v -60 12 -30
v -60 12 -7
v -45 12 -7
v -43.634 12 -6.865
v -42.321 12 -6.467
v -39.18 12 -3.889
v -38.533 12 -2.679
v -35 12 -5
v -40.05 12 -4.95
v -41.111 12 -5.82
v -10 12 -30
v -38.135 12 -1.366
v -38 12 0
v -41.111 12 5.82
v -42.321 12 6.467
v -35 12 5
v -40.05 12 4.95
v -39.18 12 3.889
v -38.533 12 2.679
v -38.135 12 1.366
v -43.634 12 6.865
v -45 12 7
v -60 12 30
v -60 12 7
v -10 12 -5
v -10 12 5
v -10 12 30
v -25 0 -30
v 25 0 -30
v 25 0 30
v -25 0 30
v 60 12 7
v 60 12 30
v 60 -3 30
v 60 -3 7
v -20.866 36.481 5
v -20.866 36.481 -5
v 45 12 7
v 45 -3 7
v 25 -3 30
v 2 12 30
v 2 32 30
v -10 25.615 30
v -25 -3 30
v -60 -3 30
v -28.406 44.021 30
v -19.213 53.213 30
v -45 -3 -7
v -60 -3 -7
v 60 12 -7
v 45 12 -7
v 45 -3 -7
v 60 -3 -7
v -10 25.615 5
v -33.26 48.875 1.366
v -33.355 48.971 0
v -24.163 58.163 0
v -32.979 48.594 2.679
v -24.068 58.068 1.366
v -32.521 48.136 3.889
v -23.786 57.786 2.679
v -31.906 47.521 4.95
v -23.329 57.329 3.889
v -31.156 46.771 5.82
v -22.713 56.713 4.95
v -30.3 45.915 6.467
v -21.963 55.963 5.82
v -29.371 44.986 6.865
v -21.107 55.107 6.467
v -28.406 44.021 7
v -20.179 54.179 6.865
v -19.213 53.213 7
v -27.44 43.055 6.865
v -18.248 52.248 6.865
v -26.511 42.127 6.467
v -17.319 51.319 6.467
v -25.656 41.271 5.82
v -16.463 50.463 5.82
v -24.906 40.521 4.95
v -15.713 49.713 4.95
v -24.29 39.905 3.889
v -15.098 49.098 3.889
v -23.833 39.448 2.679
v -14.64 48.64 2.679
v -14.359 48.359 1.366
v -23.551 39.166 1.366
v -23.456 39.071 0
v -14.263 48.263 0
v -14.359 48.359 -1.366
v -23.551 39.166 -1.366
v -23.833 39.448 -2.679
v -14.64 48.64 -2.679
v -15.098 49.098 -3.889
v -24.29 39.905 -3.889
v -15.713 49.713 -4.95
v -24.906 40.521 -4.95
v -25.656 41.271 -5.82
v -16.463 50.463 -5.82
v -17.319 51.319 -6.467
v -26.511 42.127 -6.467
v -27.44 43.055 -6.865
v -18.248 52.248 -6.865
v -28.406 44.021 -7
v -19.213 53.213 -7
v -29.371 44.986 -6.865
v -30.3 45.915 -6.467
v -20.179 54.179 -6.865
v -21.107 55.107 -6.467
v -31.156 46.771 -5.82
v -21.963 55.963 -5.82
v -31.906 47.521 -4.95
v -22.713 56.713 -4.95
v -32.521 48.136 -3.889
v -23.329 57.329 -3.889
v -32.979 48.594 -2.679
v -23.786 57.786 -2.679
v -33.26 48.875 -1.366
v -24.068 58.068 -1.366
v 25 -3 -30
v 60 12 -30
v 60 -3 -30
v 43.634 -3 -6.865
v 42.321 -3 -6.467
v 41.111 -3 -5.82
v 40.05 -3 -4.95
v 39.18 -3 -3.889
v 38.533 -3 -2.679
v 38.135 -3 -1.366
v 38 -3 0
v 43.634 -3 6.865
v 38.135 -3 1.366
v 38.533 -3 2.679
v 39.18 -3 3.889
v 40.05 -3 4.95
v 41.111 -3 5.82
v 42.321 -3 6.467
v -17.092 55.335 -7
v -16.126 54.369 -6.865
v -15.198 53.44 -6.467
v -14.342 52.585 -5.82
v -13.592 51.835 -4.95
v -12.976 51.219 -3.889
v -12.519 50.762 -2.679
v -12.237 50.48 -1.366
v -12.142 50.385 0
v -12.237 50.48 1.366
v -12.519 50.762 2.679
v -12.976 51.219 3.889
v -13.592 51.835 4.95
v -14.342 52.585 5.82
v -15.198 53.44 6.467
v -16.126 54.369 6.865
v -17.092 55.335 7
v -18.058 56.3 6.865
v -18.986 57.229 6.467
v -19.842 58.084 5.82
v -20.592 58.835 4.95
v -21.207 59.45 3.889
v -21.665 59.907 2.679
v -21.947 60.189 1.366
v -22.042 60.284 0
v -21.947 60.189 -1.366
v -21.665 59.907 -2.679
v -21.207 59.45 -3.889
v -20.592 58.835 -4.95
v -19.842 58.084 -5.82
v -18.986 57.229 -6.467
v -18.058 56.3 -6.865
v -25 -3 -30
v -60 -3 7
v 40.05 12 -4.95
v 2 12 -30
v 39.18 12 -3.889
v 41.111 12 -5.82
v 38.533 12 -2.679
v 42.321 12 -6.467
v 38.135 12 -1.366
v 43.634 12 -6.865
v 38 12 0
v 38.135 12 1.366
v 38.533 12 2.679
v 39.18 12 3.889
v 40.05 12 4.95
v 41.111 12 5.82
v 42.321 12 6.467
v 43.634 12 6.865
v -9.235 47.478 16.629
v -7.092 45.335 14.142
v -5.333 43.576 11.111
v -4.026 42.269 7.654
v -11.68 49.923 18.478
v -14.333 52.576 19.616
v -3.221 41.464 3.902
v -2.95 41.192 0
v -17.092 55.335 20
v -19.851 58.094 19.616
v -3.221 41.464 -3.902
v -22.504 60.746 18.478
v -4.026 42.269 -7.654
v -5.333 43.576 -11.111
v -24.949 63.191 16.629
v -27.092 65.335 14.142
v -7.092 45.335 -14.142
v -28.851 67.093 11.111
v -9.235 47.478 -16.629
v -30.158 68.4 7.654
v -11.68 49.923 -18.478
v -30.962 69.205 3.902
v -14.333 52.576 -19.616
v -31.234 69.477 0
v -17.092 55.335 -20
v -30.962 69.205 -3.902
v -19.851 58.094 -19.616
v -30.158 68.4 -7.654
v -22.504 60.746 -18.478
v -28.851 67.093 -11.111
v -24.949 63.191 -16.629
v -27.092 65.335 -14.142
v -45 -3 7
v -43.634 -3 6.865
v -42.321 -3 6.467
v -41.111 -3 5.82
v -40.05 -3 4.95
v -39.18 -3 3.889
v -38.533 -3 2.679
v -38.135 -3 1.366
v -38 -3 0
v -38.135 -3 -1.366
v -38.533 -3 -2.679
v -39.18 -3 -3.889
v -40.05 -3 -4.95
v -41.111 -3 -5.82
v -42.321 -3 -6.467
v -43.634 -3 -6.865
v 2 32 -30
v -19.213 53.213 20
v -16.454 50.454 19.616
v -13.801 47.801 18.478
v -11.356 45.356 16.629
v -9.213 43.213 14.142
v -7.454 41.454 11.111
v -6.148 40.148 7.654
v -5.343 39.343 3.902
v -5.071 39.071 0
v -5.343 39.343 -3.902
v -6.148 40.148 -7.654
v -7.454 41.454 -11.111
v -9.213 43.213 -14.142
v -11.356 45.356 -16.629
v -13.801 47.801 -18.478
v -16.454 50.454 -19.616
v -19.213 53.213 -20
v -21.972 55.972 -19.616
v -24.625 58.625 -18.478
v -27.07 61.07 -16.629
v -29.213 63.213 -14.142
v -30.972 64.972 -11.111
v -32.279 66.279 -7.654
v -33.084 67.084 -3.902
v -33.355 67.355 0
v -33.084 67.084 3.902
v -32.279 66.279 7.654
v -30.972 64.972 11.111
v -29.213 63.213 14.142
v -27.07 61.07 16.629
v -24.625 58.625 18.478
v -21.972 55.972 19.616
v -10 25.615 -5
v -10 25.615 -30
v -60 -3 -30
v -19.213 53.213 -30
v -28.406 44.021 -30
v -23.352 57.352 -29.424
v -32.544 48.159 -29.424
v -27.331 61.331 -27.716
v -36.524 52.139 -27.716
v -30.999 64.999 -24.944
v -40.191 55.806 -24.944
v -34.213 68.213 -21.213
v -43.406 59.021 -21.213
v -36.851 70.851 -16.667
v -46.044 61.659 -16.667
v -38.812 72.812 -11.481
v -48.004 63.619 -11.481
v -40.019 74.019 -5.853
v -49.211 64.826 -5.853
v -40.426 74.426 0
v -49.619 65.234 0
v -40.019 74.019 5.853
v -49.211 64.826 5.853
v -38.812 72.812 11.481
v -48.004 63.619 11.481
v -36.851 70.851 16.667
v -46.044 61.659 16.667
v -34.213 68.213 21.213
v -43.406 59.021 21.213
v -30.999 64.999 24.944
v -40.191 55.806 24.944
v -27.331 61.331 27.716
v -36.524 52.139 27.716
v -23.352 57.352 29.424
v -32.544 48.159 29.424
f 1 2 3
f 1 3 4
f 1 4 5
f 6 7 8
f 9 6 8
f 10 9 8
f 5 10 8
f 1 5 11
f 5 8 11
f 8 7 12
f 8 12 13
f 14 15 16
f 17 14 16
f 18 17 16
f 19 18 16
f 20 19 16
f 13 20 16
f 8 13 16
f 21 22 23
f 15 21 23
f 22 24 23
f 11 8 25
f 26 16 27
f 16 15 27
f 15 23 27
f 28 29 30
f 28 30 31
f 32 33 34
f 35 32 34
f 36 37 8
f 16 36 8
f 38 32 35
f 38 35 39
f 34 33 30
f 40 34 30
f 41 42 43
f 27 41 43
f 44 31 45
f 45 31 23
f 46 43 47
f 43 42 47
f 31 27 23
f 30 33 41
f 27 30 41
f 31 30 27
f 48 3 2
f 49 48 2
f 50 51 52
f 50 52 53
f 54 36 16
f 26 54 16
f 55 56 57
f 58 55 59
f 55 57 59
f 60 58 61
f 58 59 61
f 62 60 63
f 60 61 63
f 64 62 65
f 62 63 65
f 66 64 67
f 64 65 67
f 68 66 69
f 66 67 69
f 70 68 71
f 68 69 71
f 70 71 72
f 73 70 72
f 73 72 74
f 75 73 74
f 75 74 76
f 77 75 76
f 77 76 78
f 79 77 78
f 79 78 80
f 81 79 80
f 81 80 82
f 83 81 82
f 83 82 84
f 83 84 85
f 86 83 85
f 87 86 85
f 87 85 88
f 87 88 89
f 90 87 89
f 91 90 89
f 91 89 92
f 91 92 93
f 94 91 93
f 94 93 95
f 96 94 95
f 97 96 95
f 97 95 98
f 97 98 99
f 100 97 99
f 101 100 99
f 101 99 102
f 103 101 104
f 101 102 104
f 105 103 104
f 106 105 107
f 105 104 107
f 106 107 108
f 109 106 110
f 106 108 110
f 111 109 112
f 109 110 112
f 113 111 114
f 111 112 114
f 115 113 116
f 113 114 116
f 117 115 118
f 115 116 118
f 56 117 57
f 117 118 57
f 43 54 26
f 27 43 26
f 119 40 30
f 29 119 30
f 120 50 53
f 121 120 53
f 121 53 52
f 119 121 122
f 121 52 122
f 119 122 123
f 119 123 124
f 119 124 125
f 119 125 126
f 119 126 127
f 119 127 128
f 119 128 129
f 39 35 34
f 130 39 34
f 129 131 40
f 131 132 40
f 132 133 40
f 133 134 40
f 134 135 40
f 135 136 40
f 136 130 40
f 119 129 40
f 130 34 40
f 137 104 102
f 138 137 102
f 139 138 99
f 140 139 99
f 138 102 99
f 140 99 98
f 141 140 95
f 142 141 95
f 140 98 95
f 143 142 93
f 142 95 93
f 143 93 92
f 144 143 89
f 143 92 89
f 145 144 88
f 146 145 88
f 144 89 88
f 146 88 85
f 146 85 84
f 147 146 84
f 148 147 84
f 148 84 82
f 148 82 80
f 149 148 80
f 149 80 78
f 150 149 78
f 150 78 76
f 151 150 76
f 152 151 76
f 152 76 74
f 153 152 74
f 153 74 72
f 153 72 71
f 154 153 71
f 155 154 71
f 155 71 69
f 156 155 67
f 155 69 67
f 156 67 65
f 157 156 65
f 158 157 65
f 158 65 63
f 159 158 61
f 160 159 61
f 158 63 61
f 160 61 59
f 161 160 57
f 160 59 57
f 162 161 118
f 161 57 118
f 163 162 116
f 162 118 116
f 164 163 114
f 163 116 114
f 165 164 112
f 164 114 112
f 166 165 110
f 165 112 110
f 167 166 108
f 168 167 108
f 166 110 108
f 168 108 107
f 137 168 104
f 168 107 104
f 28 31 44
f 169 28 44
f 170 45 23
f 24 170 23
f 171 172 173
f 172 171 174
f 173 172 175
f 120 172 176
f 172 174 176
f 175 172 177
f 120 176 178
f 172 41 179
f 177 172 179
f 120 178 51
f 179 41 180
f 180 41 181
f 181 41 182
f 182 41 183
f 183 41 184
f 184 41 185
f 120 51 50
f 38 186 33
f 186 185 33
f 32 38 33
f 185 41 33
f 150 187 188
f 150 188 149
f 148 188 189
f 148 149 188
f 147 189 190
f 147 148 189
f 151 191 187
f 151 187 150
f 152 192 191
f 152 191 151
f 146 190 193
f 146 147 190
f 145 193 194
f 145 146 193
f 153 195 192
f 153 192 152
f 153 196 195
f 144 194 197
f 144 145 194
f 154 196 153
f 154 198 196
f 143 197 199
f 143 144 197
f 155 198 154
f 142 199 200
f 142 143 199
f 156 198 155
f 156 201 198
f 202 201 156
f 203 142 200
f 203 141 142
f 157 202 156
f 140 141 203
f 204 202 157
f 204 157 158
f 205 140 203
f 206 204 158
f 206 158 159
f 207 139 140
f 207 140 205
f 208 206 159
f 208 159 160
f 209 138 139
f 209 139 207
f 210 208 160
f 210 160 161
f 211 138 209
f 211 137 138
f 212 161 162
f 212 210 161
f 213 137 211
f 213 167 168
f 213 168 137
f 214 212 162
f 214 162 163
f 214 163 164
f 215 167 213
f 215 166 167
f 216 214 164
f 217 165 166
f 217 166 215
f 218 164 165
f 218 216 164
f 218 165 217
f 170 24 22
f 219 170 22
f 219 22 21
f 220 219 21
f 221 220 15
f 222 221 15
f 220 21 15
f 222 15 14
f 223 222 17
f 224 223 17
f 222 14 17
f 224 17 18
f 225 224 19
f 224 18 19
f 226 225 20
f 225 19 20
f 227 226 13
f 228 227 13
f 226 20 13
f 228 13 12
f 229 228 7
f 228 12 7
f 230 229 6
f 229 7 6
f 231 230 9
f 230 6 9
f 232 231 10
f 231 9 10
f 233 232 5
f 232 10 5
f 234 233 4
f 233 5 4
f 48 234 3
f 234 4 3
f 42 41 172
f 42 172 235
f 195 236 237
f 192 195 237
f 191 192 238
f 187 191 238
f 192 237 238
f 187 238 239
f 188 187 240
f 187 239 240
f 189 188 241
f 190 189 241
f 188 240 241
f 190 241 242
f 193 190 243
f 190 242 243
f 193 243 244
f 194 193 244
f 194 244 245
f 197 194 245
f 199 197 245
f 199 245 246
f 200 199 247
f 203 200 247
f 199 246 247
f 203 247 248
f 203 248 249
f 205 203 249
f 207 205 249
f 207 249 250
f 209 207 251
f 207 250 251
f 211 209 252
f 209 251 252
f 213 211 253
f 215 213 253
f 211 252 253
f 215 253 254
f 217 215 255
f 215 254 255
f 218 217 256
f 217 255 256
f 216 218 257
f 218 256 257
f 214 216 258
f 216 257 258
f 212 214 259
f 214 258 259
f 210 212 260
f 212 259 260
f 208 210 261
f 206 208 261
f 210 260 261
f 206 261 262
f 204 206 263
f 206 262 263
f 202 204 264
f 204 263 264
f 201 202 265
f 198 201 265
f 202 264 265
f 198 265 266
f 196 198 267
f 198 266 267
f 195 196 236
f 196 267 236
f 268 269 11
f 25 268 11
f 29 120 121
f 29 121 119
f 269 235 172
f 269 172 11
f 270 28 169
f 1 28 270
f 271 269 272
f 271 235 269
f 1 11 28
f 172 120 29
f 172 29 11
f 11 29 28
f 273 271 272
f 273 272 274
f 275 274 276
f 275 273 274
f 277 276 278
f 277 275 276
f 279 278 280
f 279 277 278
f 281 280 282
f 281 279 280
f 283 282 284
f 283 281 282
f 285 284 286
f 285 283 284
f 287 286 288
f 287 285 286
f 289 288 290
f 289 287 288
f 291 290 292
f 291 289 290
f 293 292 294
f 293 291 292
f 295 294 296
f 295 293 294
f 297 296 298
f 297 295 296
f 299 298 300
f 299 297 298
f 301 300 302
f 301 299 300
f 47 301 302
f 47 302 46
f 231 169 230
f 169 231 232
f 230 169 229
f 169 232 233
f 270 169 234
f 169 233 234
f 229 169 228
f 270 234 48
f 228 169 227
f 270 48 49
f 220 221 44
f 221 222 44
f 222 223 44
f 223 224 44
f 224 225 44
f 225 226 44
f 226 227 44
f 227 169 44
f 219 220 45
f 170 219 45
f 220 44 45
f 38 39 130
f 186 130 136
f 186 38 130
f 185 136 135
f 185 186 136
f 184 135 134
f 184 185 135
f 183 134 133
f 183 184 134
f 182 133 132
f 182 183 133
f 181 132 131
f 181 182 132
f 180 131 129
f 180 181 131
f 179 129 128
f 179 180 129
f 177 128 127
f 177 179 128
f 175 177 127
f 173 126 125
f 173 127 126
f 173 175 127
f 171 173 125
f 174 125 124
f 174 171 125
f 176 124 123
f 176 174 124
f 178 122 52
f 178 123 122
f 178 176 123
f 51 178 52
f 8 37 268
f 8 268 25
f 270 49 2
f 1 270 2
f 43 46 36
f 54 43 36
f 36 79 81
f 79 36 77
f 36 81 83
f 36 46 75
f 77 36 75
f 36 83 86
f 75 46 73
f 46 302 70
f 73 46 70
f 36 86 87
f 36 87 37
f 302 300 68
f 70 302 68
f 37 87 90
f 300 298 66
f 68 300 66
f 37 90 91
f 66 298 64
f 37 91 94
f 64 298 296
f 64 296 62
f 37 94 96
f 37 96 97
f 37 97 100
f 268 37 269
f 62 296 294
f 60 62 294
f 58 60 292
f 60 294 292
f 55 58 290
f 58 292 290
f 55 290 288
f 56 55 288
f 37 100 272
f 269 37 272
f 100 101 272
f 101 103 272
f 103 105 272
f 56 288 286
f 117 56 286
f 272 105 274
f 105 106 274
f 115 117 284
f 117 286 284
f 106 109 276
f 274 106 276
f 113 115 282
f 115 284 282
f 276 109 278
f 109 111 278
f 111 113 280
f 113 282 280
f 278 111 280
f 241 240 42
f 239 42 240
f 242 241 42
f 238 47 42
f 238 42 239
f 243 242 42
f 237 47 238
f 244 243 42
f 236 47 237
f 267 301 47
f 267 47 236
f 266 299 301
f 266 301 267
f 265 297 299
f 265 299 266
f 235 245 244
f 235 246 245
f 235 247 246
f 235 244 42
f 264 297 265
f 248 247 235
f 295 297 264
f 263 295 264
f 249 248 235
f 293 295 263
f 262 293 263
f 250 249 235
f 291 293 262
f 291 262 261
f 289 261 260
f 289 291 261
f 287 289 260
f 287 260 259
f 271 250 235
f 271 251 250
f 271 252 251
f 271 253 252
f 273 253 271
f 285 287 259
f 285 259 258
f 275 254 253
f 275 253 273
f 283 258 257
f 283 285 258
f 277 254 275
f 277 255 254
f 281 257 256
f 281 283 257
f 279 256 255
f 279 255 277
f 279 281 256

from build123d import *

# Parameters (mm, degrees)
EXTRUDE_1_DEPTH     = 30
CUT_EXTRUDE_1_DEPTH = 69.738635424
EXTRUDE_2_DEPTH     = 30
SKETCH_4_R          = 30
EXTRUDE_3_DEPTH     = 13
EXTRUDE_4_DEPTH     = 3
CUT_EXTRUDE_2_REACH = 102.632
SKETCH_5_R          = 7
RIB_1_REACH         = 102.196
SKETCH_6_WALL_W     = 230.660820914
SKETCH_6_WALL_H     = 10


with BuildPart() as part:
    # 草图1 → 凸台-拉伸1 (new, symmetric)
    with BuildSketch(Plane.XY):
        Polygon((-25, 0), (-25, -3), (-60, -3), (-60, 12), (60, 12), (60, -3), (25, -3), (25, 0), align=None)
    extrude(amount=EXTRUDE_1_DEPTH, both=True)

    # 草图2 → 切除-拉伸1 (cut, through all)
    with BuildSketch(Plane(origin=(0, 12, 0), x_dir=(1, 0, 0), z_dir=(0, 1, 0))):
        with BuildLine():
            Line((75, -7), (45, -7))
            ThreePointArc((45, -7), (38, 0), (45, 7))
            Line((45, 7), (75, 7))
            ThreePointArc((75, 7), (82, 0), (75, -7))
        make_face()
        with BuildLine():
            Line((-75, -7), (-45, -7))
            ThreePointArc((-45, -7), (-38, 0), (-45, 7))
            Line((-45, 7), (-75, 7))
            ThreePointArc((-75, 7), (-82, 0), (-75, -7))
        make_face()
    extrude(amount=-CUT_EXTRUDE_1_DEPTH, mode=Mode.SUBTRACT)

    # 草图3 → 凸台-拉伸2 (add, symmetric)
    with BuildSketch(Plane.XY):
        Polygon((-10, 12), (2, 12), (2, 32), (-19.213203436, 53.213203436), (-28.405591591, 44.02081528), (-10, 25.615223689), align=None)
    extrude(amount=EXTRUDE_2_DEPTH, both=True)

    # 草图4 → 凸台-拉伸3 (add)
    with BuildSketch(Plane(origin=(17, 17, 0), x_dir=(0, 0, -1), z_dir=(0.7071067811865483, 0.7071067811865468, 0))):
        with Locations((0, 51.213203436)):
            Circle(SKETCH_4_R)
    extrude(amount=-EXTRUDE_3_DEPTH)

    # 草图4<3> → 凸台-拉伸4 (add)
    with BuildSketch(Plane(origin=(17, 17, 0), x_dir=(0, 0, -1), z_dir=(0.7071067811865483, 0.7071067811865468, 0))):
        with BuildLine():
            Line((7, 51.213203436), (20, 51.213203436))
            ThreePointArc((20, 51.213203436), (0, 71.213203436), (-20, 51.213203436))
            Line((-20, 51.213203436), (-7, 51.213203436))
            ThreePointArc((-7, 51.213203436), (0, 58.213203436), (7, 51.213203436))
        make_face()
        with BuildLine():
            ThreePointArc((-20, 51.213203436), (0, 31.213203436), (20, 51.213203436))
            Line((20, 51.213203436), (7, 51.213203436))
            ThreePointArc((7, 51.213203436), (0, 44.213203436), (-7, 51.213203436))
            Line((-7, 51.213203436), (-20, 51.213203436))
        make_face()
    extrude(amount=EXTRUDE_4_DEPTH)

    # 草图5 → 切除-拉伸2 (cut, up to next)
    with BuildSketch(Plane(origin=(17, 17, 0), x_dir=(0, 0, -1), z_dir=(0.7071067811865483, 0.7071067811865468, 0)), mode=Mode.PRIVATE) as cut_extrude_2_sk1:
        with Locations(Location((0, 51.213203436, 0), (0, 0, 90))):
            Circle(SKETCH_5_R)
    cut_extrude_2_tool1 = extrude(cut_extrude_2_sk1.sketch, amount=-CUT_EXTRUDE_2_REACH, mode=Mode.PRIVATE) & part.part
    add(cut_extrude_2_tool1.solids().sort_by_distance((-19.213203, 53.213203, 0))[0], mode=Mode.SUBTRACT)

    # 草图6 wall → 筋1 (add, up to next)
    with BuildSketch(Plane(origin=(-27.932923579, 24.240535423, 0), x_dir=(-0.5, -0.866025403784, 0), z_dir=(0.866025403784, -0.5, 0)), mode=Mode.PRIVATE) as rib_1_sk1:
        Rectangle(SKETCH_6_WALL_W, SKETCH_6_WALL_H)
    rib_1_tool1 = extrude(rib_1_sk1.sketch, amount=RIB_1_REACH, mode=Mode.PRIVATE) - part.part
    add(rib_1_tool1.solids().sort_by_distance((-27.932923579, 24.240535423, 0))[0])


solid = part.part
